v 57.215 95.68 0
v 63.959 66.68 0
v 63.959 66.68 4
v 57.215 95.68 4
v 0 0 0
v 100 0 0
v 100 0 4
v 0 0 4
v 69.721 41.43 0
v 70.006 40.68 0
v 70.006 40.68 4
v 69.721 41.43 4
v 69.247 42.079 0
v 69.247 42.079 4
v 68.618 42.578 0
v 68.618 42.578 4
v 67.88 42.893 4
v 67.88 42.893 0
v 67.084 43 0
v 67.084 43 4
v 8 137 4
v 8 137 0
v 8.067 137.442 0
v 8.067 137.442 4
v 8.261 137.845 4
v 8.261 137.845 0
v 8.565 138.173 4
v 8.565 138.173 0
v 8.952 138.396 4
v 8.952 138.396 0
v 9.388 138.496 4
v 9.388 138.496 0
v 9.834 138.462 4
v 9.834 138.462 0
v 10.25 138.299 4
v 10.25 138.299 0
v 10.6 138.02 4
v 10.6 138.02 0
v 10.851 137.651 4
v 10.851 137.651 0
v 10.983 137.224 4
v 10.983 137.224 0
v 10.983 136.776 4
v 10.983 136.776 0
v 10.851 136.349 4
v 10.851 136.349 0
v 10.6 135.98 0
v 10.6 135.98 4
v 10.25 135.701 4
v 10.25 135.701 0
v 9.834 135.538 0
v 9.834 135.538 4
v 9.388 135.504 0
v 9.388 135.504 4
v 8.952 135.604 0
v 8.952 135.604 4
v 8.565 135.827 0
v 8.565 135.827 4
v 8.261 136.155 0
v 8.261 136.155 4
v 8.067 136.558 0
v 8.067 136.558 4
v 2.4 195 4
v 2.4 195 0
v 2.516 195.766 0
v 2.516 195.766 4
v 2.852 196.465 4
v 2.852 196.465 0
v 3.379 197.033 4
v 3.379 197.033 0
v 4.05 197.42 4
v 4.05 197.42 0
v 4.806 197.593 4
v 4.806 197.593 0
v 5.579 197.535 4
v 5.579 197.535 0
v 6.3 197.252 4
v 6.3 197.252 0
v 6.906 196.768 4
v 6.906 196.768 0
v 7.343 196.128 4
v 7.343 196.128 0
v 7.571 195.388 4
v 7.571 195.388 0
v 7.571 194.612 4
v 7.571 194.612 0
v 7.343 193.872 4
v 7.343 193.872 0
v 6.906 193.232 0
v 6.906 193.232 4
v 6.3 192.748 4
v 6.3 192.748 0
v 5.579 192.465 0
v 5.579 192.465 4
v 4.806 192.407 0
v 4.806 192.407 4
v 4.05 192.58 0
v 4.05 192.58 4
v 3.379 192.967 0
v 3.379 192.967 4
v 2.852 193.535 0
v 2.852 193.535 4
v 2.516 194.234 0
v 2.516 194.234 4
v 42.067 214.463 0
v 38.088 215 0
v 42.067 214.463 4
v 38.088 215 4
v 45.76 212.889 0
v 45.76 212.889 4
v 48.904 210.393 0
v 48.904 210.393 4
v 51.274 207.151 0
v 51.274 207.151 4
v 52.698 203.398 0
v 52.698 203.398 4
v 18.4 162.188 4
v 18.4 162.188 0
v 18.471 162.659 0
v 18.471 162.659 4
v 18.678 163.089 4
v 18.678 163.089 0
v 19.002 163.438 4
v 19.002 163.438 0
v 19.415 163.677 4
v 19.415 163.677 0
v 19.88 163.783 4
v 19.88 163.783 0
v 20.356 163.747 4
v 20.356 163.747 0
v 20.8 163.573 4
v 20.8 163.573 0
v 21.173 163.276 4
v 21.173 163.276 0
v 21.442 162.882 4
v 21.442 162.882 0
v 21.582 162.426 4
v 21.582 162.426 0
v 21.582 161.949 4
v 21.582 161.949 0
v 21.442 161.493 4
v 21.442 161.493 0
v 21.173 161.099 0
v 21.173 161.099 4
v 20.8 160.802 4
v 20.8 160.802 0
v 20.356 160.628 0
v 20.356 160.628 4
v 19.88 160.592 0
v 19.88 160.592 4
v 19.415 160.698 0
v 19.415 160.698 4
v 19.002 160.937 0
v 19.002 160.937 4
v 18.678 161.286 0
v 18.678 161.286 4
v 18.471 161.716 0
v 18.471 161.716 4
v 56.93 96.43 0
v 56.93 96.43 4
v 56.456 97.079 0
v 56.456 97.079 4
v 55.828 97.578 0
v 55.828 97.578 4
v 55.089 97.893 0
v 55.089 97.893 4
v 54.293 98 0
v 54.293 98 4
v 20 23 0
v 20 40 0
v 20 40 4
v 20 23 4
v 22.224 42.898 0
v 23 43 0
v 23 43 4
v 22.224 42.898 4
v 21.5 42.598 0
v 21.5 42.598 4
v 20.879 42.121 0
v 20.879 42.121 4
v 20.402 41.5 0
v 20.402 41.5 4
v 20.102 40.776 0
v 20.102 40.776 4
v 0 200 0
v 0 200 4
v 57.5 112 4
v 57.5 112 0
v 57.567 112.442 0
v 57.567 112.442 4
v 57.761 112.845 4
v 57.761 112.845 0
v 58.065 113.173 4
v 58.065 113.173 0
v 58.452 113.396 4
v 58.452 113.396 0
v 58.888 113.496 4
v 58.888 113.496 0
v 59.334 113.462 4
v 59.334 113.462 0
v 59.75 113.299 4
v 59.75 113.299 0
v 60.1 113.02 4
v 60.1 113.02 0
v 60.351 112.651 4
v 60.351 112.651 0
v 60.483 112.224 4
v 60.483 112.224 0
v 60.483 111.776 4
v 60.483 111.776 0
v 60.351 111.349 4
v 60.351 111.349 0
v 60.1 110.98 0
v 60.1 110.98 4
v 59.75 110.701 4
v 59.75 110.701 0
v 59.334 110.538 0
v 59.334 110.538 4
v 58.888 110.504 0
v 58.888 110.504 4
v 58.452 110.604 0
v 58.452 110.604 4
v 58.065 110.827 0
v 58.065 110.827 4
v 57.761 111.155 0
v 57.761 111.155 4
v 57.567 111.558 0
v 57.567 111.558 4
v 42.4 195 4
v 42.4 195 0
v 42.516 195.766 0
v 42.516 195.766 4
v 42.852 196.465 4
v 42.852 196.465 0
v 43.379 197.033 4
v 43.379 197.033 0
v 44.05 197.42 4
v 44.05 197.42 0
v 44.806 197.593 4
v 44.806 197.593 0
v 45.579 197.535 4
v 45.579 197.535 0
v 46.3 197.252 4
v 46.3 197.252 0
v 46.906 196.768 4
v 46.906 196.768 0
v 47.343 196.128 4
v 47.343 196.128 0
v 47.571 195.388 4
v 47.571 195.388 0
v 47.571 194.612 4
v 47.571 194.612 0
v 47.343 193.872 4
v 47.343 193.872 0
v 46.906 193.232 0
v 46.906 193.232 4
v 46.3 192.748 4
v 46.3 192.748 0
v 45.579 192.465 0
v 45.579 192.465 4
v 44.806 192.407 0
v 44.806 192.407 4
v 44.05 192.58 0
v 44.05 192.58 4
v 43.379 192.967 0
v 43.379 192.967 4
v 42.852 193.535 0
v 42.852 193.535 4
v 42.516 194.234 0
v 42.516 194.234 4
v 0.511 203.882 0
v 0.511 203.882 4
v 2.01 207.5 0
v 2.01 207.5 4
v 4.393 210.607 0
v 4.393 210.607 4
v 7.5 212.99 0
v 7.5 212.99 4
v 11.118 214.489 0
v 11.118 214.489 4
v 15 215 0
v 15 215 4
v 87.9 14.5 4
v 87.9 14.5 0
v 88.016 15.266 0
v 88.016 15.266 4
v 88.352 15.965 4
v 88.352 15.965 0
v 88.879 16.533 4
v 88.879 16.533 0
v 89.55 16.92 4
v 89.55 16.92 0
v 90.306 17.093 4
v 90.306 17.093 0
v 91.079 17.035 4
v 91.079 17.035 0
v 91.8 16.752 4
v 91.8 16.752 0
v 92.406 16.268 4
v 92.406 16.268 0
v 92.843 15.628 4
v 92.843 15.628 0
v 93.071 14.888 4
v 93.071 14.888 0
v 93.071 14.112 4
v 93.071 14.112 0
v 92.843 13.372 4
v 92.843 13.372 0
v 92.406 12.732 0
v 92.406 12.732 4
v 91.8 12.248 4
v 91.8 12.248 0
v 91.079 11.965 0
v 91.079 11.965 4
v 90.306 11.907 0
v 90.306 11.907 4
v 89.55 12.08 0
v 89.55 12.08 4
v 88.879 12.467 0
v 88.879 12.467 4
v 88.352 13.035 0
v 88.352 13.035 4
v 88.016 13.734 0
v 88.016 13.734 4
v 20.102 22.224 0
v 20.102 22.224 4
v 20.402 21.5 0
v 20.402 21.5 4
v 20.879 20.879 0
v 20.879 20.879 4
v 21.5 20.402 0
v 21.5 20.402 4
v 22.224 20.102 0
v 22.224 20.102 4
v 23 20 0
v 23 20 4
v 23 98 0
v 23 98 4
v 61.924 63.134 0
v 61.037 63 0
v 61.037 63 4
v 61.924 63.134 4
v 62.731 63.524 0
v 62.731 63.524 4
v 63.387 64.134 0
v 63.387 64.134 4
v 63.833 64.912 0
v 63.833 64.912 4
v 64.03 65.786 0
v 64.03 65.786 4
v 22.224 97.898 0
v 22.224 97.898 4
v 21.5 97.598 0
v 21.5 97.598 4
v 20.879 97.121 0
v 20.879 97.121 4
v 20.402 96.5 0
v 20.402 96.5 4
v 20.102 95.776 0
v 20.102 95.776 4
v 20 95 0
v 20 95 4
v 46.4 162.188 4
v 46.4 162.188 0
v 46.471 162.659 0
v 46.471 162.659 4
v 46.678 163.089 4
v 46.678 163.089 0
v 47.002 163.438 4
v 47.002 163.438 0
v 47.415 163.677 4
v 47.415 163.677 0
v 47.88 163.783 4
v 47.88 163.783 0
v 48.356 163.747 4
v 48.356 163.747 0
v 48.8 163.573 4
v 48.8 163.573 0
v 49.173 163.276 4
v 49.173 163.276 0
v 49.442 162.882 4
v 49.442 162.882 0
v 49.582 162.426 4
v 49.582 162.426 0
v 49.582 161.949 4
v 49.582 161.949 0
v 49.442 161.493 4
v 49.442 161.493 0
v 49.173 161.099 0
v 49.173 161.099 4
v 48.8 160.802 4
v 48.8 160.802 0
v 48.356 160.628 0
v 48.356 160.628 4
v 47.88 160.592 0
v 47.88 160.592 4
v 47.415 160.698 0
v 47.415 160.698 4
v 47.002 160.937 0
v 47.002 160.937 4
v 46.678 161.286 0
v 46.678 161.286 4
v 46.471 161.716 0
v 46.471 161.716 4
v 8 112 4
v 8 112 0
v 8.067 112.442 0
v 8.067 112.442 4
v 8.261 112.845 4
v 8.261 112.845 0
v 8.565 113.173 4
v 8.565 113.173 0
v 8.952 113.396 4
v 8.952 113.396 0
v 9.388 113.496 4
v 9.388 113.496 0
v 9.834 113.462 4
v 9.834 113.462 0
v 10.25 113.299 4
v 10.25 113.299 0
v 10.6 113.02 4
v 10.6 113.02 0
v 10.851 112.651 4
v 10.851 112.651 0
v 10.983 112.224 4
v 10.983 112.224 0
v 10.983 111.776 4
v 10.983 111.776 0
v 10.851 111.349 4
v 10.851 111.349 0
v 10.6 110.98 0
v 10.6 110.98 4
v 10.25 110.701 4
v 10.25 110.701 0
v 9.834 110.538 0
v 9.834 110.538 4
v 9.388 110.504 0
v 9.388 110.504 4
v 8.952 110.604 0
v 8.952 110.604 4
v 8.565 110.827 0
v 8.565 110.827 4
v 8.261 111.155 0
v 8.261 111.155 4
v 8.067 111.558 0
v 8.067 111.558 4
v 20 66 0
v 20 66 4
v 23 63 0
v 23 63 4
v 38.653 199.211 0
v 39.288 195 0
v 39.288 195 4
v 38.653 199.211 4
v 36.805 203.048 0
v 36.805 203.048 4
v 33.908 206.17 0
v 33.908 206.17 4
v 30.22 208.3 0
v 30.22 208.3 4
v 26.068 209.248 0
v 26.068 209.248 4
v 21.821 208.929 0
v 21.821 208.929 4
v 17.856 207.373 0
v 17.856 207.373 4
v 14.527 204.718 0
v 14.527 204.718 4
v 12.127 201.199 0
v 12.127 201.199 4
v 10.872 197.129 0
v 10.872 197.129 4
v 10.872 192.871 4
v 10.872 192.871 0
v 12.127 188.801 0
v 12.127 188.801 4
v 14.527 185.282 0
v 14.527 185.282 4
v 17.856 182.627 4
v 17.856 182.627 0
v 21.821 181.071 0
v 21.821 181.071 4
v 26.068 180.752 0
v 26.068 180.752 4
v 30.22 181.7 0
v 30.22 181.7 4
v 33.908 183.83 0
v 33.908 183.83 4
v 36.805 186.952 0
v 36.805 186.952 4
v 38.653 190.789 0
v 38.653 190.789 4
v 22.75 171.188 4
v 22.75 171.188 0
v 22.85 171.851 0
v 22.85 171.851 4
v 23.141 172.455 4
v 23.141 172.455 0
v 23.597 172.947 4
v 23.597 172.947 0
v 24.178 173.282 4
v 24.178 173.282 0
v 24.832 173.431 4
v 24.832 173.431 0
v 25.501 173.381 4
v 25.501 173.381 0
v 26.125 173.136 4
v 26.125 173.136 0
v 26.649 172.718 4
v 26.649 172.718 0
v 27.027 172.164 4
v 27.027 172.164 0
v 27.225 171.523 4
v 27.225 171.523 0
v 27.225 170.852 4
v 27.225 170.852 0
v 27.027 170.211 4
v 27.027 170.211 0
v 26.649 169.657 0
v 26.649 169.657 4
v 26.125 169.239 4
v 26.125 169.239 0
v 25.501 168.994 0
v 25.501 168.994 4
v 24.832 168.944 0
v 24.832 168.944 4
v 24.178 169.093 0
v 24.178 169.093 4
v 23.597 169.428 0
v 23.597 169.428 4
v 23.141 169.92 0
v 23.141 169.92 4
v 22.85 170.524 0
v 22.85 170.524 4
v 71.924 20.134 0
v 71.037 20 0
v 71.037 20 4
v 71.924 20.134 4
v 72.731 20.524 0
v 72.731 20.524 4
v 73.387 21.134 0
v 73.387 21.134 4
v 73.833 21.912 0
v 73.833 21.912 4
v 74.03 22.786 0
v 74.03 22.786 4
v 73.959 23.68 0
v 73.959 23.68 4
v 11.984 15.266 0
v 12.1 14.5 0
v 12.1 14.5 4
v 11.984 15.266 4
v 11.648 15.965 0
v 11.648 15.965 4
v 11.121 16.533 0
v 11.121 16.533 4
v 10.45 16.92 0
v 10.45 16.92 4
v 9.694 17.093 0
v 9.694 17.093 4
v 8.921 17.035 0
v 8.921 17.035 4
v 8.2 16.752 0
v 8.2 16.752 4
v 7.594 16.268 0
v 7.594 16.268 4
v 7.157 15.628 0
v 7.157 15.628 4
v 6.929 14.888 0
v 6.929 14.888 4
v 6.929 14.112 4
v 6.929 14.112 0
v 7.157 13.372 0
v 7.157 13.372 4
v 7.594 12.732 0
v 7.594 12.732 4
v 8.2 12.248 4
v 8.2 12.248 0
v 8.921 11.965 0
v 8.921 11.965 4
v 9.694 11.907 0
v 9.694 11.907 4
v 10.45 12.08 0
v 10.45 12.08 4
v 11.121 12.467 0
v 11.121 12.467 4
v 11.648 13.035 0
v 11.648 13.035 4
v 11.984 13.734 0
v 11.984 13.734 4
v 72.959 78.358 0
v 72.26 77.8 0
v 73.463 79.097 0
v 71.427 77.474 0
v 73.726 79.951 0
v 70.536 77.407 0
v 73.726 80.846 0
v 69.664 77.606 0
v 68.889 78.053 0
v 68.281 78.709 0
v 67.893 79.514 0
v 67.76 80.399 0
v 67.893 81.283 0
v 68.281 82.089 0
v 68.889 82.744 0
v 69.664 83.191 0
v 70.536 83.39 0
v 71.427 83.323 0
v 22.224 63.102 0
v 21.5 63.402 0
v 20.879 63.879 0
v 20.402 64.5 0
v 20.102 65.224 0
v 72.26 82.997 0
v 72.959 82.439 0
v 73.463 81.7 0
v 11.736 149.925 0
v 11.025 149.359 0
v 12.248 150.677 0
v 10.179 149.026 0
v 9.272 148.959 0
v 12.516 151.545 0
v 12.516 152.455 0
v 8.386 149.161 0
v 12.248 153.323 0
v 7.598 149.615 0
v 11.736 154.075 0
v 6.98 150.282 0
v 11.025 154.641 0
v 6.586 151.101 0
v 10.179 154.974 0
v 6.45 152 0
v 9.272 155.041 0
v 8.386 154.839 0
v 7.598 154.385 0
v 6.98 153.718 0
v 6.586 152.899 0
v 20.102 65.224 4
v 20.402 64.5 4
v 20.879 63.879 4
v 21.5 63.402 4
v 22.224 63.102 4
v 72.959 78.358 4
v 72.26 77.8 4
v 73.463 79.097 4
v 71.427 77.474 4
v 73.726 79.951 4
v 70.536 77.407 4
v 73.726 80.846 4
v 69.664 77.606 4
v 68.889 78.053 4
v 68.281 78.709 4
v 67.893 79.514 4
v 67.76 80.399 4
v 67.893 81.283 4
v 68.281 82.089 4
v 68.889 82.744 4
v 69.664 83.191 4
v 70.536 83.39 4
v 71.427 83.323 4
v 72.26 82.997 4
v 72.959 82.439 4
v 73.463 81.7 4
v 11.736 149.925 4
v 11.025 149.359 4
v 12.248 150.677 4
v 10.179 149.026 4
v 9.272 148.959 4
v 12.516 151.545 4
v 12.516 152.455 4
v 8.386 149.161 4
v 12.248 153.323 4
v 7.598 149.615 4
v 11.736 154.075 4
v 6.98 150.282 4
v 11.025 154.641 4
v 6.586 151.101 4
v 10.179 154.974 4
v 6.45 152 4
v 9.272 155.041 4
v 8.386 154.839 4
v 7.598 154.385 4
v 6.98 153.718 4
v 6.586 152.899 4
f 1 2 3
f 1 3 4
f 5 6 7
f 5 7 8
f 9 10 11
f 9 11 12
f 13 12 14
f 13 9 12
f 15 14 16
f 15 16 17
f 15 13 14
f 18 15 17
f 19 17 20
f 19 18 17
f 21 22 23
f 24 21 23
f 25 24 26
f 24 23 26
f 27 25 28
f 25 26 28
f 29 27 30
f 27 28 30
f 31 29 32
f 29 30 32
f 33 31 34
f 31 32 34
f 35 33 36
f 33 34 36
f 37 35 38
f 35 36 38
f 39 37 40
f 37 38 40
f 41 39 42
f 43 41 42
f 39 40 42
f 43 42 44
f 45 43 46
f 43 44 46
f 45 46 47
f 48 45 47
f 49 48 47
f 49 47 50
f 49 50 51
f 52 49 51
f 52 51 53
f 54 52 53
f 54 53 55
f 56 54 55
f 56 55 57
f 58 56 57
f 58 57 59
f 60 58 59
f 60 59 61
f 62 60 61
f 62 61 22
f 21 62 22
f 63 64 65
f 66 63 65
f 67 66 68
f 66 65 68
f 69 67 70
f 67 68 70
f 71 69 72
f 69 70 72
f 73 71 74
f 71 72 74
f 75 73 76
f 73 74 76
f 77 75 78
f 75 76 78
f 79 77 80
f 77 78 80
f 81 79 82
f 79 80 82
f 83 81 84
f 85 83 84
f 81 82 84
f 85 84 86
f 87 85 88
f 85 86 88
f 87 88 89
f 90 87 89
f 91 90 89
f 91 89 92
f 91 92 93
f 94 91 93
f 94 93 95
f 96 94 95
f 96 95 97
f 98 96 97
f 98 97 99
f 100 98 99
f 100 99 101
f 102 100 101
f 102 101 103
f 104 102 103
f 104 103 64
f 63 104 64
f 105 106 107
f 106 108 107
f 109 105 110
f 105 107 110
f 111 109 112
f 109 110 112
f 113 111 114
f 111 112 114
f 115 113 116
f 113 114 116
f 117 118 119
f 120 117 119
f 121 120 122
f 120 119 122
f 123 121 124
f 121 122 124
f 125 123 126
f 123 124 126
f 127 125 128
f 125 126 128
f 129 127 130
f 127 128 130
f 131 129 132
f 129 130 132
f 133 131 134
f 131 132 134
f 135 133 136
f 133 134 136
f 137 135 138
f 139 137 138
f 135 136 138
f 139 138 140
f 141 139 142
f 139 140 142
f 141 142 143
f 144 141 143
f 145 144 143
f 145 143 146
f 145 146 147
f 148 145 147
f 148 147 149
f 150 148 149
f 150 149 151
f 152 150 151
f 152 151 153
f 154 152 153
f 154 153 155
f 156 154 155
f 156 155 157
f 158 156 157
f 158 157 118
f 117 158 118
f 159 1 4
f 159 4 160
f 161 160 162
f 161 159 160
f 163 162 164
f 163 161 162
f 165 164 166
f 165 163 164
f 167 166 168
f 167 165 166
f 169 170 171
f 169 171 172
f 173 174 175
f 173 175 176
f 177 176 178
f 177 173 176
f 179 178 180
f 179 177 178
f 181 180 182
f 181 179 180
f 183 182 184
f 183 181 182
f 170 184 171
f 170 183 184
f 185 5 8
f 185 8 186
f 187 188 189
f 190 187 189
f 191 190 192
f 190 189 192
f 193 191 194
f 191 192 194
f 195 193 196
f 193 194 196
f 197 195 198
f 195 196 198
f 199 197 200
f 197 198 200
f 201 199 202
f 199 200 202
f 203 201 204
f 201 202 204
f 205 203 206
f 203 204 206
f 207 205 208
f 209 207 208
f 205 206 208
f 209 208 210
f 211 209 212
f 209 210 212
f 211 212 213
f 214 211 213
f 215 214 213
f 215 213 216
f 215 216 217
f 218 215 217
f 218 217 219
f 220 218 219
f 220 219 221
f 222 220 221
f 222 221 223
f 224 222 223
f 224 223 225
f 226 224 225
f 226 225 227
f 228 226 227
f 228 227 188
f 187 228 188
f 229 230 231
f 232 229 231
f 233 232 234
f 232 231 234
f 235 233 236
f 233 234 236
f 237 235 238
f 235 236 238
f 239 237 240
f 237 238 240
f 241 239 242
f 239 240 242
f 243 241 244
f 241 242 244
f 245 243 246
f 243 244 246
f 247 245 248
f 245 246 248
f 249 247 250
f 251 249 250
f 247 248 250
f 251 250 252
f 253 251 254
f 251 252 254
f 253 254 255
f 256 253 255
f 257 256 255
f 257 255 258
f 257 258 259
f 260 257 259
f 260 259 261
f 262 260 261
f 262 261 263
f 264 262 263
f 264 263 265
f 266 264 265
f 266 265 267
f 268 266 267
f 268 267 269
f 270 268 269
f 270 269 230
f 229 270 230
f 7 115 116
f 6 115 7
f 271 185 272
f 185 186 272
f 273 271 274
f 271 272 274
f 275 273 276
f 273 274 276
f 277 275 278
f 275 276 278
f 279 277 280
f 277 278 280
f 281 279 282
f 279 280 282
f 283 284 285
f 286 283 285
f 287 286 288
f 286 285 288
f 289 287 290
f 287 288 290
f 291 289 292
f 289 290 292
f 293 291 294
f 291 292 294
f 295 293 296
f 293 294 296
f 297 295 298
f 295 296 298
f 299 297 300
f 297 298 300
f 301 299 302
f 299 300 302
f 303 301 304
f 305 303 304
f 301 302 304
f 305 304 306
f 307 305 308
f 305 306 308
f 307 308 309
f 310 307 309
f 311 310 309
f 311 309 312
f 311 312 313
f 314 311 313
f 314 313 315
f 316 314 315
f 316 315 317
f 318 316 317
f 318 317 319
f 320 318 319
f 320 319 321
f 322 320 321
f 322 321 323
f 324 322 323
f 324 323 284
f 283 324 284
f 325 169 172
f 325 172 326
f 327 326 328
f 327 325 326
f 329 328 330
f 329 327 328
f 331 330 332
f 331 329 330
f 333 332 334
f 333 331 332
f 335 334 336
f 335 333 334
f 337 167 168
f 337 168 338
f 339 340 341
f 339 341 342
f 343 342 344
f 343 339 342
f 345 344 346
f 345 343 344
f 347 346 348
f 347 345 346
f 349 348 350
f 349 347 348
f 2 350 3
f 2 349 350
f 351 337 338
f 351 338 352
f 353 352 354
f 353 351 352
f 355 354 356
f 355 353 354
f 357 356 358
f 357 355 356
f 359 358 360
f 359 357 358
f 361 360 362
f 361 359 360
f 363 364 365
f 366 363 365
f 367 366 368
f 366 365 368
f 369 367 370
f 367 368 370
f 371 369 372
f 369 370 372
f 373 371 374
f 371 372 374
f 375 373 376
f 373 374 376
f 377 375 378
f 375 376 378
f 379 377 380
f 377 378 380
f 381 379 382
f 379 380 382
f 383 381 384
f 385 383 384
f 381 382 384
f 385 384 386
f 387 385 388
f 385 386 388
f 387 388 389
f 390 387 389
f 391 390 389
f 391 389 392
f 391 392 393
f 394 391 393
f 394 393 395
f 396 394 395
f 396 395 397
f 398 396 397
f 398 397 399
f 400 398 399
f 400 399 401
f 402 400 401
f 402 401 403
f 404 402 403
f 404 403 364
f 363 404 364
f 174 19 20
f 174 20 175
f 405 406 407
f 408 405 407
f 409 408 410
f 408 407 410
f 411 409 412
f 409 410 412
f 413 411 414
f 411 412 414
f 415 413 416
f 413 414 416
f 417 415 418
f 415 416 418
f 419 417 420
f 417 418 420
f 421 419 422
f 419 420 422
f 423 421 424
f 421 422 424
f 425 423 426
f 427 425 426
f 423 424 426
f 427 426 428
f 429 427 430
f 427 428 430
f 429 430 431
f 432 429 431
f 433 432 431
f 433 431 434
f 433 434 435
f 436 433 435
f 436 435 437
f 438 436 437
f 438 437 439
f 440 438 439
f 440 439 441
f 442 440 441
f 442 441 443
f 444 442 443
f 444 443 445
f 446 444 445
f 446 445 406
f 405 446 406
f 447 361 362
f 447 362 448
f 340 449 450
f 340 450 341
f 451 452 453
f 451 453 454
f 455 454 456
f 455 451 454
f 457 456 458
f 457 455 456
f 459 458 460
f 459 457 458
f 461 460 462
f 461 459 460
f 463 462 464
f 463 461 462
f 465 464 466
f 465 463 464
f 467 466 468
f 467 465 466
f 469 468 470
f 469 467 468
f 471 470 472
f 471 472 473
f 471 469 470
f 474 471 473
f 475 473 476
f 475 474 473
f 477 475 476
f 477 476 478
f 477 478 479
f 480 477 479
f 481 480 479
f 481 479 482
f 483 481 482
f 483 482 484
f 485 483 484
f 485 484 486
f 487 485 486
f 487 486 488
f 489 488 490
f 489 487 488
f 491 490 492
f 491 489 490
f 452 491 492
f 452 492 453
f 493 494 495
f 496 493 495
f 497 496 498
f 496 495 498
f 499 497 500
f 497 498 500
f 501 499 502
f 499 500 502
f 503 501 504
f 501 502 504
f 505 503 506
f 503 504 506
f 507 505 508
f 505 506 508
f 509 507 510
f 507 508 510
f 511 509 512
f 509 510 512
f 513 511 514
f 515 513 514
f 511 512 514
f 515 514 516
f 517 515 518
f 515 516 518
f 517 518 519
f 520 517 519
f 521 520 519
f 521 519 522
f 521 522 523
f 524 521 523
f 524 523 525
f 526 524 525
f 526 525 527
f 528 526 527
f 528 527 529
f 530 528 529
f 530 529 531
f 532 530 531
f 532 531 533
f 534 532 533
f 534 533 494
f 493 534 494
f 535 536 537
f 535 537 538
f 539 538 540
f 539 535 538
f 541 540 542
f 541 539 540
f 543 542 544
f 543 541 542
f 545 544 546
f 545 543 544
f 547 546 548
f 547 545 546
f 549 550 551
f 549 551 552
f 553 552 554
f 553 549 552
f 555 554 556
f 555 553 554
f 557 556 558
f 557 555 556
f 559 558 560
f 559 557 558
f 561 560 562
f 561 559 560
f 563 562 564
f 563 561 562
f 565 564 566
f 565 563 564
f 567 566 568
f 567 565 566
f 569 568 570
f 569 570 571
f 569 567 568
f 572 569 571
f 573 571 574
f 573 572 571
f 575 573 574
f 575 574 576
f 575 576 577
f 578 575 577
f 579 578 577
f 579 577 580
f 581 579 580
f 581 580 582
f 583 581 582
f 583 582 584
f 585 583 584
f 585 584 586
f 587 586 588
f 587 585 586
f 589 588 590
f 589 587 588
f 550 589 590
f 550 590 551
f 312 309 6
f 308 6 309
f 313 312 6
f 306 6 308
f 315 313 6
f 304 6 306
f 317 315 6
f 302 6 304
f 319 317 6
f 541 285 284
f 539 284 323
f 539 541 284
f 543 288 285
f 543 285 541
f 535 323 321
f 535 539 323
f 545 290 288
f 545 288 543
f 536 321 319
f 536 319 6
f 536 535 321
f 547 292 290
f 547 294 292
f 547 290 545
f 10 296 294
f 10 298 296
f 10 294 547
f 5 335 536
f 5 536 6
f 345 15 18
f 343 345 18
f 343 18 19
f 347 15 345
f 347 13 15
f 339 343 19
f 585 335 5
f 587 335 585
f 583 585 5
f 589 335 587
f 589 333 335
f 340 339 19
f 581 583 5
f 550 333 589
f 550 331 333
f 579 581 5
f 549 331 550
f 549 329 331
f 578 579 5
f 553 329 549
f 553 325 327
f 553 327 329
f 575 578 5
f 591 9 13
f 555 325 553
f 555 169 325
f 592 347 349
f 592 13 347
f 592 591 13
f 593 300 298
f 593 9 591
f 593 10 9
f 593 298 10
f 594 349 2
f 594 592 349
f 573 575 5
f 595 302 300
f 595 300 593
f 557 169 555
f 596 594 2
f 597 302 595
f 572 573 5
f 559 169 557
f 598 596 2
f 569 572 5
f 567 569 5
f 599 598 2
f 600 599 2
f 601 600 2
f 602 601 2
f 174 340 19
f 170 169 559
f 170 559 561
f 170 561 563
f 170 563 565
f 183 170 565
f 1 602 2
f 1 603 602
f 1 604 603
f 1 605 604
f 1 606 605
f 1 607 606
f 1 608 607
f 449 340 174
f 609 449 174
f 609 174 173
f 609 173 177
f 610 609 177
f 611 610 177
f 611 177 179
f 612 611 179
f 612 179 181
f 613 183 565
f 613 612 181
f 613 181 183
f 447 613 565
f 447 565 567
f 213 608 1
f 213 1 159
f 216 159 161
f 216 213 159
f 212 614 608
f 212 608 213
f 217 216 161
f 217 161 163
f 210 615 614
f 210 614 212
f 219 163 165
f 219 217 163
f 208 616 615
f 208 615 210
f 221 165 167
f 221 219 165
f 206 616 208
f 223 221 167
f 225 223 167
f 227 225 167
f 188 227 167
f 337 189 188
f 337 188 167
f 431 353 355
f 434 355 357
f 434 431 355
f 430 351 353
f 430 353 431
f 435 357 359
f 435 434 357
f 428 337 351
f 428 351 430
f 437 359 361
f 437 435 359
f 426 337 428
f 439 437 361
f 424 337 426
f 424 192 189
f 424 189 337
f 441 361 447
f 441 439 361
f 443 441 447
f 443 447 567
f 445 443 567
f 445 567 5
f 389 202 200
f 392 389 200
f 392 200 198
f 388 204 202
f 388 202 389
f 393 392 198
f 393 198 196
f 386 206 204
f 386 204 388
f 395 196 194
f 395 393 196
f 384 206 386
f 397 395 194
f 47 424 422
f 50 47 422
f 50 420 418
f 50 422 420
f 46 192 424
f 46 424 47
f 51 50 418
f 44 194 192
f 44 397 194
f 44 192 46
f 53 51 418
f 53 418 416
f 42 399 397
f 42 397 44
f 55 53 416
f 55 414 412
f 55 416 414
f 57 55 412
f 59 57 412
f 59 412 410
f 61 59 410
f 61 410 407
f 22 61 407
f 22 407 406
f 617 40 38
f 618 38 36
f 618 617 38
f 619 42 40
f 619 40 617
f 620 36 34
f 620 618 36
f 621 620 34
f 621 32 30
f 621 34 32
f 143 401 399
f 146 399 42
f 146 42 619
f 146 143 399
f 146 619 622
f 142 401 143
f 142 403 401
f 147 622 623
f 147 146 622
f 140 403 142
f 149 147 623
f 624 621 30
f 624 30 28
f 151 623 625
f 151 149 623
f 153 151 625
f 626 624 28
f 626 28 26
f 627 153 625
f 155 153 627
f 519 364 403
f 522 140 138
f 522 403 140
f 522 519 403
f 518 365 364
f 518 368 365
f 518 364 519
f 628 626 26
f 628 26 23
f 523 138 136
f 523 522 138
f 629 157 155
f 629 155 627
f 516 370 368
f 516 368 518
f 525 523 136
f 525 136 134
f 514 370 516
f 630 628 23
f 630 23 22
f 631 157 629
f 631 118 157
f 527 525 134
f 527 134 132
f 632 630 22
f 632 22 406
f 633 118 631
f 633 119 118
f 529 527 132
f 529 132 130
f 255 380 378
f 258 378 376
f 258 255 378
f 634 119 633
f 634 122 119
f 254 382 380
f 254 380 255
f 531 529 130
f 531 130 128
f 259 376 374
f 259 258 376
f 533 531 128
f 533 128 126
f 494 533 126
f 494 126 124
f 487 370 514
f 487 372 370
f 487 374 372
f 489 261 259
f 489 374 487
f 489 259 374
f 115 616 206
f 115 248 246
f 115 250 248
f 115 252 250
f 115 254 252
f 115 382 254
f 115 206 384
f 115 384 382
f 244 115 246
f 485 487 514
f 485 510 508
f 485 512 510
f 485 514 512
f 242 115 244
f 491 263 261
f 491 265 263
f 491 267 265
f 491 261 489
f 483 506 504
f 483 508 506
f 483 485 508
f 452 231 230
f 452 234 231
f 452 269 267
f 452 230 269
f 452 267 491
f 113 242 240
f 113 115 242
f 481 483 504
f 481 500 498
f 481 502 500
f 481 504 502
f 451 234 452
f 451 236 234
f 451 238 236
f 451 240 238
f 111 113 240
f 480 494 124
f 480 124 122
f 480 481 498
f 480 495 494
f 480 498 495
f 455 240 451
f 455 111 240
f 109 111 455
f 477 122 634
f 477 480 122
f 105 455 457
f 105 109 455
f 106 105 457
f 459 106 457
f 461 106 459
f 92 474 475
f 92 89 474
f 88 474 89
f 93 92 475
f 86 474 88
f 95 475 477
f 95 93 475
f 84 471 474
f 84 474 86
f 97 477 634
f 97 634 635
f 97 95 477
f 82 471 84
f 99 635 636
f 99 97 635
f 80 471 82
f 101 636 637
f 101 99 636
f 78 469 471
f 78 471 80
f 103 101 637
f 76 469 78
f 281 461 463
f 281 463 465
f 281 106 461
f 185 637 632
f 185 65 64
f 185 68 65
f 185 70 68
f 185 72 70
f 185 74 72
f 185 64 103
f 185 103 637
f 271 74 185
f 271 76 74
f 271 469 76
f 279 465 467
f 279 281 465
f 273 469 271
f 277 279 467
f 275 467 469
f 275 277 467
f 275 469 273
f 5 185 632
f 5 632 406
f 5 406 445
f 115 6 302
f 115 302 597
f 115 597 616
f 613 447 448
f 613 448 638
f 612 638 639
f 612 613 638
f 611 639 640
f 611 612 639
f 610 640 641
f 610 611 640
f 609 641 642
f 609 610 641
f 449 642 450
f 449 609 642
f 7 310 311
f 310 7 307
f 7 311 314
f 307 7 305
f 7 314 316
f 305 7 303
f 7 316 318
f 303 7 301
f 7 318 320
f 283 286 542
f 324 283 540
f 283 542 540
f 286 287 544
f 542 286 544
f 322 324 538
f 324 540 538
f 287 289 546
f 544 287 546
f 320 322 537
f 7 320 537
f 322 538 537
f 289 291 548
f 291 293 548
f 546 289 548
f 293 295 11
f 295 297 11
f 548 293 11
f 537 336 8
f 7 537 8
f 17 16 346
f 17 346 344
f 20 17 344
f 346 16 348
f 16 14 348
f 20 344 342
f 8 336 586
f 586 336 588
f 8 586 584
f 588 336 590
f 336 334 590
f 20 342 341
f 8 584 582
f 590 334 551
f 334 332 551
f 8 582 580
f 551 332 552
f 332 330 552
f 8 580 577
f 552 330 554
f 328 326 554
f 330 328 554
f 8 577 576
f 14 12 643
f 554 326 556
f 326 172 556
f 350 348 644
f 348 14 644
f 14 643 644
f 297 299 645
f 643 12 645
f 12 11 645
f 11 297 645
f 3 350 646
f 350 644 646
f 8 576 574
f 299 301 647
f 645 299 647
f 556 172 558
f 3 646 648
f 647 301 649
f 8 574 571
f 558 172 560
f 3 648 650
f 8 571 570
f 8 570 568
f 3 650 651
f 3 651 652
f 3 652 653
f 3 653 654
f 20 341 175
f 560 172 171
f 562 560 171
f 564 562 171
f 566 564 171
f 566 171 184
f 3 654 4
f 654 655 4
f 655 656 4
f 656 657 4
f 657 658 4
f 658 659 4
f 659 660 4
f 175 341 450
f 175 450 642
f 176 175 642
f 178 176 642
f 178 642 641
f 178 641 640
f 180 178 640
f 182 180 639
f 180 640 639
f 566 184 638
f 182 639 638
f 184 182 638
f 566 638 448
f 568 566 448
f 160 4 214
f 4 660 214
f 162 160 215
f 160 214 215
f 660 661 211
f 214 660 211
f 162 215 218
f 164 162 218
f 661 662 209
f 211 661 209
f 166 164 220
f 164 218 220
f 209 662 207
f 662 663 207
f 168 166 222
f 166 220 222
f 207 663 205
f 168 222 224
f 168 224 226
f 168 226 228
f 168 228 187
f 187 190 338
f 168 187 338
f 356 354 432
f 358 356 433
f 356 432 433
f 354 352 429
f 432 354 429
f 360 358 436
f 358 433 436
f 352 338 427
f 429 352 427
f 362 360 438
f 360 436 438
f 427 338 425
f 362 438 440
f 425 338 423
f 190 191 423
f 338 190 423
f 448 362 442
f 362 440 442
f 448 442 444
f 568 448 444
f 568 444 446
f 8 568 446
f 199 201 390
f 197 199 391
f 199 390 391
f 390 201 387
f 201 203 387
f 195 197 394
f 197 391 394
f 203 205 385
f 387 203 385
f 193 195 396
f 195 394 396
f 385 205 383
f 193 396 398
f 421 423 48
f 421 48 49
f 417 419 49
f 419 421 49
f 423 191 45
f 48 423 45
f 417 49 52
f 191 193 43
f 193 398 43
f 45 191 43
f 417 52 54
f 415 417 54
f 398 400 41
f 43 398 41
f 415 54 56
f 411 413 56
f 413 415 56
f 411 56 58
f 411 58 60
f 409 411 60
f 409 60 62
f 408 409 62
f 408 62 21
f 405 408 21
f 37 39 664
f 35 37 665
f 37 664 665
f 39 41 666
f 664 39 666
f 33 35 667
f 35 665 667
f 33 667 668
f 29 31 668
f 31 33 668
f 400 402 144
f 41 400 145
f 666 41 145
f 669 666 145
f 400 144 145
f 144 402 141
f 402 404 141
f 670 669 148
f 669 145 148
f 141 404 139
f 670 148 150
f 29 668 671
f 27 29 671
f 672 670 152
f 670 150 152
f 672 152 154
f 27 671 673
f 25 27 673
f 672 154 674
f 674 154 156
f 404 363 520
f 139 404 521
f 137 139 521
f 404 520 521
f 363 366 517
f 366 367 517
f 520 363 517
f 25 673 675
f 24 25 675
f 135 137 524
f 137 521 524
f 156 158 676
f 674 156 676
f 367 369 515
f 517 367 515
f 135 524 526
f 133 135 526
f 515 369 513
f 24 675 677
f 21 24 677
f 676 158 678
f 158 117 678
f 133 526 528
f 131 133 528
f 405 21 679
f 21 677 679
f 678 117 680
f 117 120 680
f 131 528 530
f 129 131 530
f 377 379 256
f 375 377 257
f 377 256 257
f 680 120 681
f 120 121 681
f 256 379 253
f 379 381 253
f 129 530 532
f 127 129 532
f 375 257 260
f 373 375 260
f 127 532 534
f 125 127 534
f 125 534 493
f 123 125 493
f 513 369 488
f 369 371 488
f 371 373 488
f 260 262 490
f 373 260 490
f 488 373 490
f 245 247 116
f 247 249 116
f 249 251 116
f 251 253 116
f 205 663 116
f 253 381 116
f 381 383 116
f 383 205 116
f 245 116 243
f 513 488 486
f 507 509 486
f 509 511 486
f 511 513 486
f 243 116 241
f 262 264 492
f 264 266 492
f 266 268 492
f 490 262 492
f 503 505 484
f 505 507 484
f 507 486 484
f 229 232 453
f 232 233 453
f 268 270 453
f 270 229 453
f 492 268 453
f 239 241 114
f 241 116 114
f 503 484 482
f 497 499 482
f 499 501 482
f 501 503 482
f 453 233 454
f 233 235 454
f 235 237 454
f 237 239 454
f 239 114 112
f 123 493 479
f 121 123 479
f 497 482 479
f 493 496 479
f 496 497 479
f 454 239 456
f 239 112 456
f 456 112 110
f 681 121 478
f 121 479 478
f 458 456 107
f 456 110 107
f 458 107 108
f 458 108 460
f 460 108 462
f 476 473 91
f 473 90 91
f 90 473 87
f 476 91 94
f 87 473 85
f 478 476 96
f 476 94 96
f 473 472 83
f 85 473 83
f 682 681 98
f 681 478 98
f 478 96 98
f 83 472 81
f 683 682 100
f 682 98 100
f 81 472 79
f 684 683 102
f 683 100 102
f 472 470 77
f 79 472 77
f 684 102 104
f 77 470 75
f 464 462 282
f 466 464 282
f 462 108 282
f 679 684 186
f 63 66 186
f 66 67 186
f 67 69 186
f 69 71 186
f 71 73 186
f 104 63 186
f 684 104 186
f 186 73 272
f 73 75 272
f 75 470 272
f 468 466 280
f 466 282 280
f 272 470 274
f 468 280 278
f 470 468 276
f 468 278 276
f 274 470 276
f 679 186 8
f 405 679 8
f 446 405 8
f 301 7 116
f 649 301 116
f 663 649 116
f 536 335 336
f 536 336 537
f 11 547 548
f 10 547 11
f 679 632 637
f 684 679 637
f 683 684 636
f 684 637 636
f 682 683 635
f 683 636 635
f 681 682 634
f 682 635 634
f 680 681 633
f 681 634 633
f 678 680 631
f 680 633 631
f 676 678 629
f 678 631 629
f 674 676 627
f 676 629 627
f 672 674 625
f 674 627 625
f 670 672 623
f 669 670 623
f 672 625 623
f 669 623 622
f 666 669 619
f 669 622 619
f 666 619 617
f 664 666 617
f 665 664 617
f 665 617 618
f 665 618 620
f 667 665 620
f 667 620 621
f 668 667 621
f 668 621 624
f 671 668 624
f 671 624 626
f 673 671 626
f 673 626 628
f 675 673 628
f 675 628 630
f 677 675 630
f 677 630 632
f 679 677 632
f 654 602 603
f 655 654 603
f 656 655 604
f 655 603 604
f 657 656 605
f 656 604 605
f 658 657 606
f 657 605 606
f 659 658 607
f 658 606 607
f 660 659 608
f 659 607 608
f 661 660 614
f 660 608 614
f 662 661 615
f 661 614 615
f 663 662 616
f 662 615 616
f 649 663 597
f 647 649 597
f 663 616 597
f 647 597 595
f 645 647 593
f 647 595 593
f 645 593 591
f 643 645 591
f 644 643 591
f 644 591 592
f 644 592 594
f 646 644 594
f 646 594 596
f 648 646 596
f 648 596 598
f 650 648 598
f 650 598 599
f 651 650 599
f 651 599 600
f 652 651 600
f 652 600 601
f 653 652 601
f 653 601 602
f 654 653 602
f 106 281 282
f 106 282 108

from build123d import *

# Parameters (mm, degrees)
ESBO_O1_R                = 14.2875
ESBO_O1_R_2              = 2.6
RESSALTO_EXTRUS_O2_DEPTH = 4
FILETE1_R                = 15
ESBO_O3_R                = 1.5
ESBO_O3_R_2              = 2.6
ESBO_O3_R_3              = 3.05
CORTE_EXTRUS_O1_DEPTH    = 5
ESBO_O5_R                = 2.25
ESBO_O5_R_2              = 3
ESBO_O5_R_3              = 1.6
ESBO_O5_R_4              = 2.6
CORTE_EXTRUS_O2_DEPTH    = 5


with BuildPart() as part:
    # Esboço1 → Ressalto-extrusão2 (new body)
    with BuildSketch(Plane.XY):
        Polygon((0, 0), (0, 215), (50, 215), (100, 0), align=None)
        with Locations((25, 195)):
            Circle(ESBO_O1_R, mode=Mode.SUBTRACT)
        with Locations((9.5, 14.5)):
            Circle(ESBO_O1_R_2, mode=Mode.SUBTRACT)
        with BuildLine():
            Line((20, 95), (20, 66))
            ThreePointArc((20, 66), (20.878679656, 63.878679656), (23, 63))
            Line((23, 63), (61.03739436, 63))
            ThreePointArc((61.03739436, 63), (63.386715693, 64.134339454), (63.959418441, 66.679540484))
            Line((63.959418441, 66.679540484), (57.215232395, 95.679540484))
            ThreePointArc((57.215232395, 95.679540484), (56.15886886, 97.349321333), (54.293208314, 98))
            Line((54.293208314, 98), (23, 98))
            ThreePointArc((23, 98), (20.878679656, 97.121320344), (20, 95))
        make_face(mode=Mode.SUBTRACT)
        with BuildLine():
            Line((20, 40), (20, 23))
            ThreePointArc((20, 23), (20.878679656, 20.878679656), (23, 20))
            Line((23, 20), (71.03739436, 20))
            ThreePointArc((71.03739436, 20), (73.386715693, 21.134339454), (73.959418441, 23.679540484))
            Line((73.959418441, 23.679540484), (70.005930069, 40.679540484))
            ThreePointArc((70.005930069, 40.679540484), (68.949566534, 42.349321333), (67.083905988, 43))
            Line((67.083905988, 43), (23, 43))
            ThreePointArc((23, 43), (20.878679656, 42.121320344), (20, 40))
        make_face(mode=Mode.SUBTRACT)
    extrude(amount=RESSALTO_EXTRUS_O2_DEPTH)

    # Filete1
    filete1_edges = [part.edges().sort_by_distance(p)[0] for p in [
        (0, 215, 2),
        (50, 215, 2),
    ]]
    fillet(filete1_edges, radius=FILETE1_R)

    # Esboço3 → Corte-extrusão1 (cut, through all)
    with BuildSketch(Plane(origin=(0, 0, 0), x_dir=(-1, 0, 0), z_dir=(0, 0, -1))):
        with Locations((-9.5, 112)):
            Circle(ESBO_O3_R)
        with Locations((-90.5, 14.5)):
            Circle(ESBO_O3_R_2)
        with Locations((-9.5, 137)):
            Circle(ESBO_O3_R)
        with Locations((-9.5, 152)):
            Circle(ESBO_O3_R_3)
        with Locations((-59, 112)):
            Circle(ESBO_O3_R)
    extrude(amount=-CORTE_EXTRUS_O1_DEPTH, mode=Mode.SUBTRACT)

    # Esboço5 → Corte-extrusão2 (cut, through all)
    with BuildSketch(Plane(origin=(0, 0, 0), x_dir=(-1, 0, 0), z_dir=(0, 0, -1))):
        with Locations((-25, 171.1875)):
            Circle(ESBO_O5_R)
        with Locations((-70.759810426, 80.398555206)):
            Circle(ESBO_O5_R_2)
        with Locations((-20, 162.1875)):
            Circle(ESBO_O5_R_3)
        with Locations((-48, 162.1875)):
            Circle(ESBO_O5_R_3)
        with Locations((-45, 195)):
            Circle(ESBO_O5_R_4)
        with Locations((-5, 195)):
            Circle(ESBO_O5_R_4)
    extrude(amount=-CORTE_EXTRUS_O2_DEPTH, mode=Mode.SUBTRACT)


solid = part.part
